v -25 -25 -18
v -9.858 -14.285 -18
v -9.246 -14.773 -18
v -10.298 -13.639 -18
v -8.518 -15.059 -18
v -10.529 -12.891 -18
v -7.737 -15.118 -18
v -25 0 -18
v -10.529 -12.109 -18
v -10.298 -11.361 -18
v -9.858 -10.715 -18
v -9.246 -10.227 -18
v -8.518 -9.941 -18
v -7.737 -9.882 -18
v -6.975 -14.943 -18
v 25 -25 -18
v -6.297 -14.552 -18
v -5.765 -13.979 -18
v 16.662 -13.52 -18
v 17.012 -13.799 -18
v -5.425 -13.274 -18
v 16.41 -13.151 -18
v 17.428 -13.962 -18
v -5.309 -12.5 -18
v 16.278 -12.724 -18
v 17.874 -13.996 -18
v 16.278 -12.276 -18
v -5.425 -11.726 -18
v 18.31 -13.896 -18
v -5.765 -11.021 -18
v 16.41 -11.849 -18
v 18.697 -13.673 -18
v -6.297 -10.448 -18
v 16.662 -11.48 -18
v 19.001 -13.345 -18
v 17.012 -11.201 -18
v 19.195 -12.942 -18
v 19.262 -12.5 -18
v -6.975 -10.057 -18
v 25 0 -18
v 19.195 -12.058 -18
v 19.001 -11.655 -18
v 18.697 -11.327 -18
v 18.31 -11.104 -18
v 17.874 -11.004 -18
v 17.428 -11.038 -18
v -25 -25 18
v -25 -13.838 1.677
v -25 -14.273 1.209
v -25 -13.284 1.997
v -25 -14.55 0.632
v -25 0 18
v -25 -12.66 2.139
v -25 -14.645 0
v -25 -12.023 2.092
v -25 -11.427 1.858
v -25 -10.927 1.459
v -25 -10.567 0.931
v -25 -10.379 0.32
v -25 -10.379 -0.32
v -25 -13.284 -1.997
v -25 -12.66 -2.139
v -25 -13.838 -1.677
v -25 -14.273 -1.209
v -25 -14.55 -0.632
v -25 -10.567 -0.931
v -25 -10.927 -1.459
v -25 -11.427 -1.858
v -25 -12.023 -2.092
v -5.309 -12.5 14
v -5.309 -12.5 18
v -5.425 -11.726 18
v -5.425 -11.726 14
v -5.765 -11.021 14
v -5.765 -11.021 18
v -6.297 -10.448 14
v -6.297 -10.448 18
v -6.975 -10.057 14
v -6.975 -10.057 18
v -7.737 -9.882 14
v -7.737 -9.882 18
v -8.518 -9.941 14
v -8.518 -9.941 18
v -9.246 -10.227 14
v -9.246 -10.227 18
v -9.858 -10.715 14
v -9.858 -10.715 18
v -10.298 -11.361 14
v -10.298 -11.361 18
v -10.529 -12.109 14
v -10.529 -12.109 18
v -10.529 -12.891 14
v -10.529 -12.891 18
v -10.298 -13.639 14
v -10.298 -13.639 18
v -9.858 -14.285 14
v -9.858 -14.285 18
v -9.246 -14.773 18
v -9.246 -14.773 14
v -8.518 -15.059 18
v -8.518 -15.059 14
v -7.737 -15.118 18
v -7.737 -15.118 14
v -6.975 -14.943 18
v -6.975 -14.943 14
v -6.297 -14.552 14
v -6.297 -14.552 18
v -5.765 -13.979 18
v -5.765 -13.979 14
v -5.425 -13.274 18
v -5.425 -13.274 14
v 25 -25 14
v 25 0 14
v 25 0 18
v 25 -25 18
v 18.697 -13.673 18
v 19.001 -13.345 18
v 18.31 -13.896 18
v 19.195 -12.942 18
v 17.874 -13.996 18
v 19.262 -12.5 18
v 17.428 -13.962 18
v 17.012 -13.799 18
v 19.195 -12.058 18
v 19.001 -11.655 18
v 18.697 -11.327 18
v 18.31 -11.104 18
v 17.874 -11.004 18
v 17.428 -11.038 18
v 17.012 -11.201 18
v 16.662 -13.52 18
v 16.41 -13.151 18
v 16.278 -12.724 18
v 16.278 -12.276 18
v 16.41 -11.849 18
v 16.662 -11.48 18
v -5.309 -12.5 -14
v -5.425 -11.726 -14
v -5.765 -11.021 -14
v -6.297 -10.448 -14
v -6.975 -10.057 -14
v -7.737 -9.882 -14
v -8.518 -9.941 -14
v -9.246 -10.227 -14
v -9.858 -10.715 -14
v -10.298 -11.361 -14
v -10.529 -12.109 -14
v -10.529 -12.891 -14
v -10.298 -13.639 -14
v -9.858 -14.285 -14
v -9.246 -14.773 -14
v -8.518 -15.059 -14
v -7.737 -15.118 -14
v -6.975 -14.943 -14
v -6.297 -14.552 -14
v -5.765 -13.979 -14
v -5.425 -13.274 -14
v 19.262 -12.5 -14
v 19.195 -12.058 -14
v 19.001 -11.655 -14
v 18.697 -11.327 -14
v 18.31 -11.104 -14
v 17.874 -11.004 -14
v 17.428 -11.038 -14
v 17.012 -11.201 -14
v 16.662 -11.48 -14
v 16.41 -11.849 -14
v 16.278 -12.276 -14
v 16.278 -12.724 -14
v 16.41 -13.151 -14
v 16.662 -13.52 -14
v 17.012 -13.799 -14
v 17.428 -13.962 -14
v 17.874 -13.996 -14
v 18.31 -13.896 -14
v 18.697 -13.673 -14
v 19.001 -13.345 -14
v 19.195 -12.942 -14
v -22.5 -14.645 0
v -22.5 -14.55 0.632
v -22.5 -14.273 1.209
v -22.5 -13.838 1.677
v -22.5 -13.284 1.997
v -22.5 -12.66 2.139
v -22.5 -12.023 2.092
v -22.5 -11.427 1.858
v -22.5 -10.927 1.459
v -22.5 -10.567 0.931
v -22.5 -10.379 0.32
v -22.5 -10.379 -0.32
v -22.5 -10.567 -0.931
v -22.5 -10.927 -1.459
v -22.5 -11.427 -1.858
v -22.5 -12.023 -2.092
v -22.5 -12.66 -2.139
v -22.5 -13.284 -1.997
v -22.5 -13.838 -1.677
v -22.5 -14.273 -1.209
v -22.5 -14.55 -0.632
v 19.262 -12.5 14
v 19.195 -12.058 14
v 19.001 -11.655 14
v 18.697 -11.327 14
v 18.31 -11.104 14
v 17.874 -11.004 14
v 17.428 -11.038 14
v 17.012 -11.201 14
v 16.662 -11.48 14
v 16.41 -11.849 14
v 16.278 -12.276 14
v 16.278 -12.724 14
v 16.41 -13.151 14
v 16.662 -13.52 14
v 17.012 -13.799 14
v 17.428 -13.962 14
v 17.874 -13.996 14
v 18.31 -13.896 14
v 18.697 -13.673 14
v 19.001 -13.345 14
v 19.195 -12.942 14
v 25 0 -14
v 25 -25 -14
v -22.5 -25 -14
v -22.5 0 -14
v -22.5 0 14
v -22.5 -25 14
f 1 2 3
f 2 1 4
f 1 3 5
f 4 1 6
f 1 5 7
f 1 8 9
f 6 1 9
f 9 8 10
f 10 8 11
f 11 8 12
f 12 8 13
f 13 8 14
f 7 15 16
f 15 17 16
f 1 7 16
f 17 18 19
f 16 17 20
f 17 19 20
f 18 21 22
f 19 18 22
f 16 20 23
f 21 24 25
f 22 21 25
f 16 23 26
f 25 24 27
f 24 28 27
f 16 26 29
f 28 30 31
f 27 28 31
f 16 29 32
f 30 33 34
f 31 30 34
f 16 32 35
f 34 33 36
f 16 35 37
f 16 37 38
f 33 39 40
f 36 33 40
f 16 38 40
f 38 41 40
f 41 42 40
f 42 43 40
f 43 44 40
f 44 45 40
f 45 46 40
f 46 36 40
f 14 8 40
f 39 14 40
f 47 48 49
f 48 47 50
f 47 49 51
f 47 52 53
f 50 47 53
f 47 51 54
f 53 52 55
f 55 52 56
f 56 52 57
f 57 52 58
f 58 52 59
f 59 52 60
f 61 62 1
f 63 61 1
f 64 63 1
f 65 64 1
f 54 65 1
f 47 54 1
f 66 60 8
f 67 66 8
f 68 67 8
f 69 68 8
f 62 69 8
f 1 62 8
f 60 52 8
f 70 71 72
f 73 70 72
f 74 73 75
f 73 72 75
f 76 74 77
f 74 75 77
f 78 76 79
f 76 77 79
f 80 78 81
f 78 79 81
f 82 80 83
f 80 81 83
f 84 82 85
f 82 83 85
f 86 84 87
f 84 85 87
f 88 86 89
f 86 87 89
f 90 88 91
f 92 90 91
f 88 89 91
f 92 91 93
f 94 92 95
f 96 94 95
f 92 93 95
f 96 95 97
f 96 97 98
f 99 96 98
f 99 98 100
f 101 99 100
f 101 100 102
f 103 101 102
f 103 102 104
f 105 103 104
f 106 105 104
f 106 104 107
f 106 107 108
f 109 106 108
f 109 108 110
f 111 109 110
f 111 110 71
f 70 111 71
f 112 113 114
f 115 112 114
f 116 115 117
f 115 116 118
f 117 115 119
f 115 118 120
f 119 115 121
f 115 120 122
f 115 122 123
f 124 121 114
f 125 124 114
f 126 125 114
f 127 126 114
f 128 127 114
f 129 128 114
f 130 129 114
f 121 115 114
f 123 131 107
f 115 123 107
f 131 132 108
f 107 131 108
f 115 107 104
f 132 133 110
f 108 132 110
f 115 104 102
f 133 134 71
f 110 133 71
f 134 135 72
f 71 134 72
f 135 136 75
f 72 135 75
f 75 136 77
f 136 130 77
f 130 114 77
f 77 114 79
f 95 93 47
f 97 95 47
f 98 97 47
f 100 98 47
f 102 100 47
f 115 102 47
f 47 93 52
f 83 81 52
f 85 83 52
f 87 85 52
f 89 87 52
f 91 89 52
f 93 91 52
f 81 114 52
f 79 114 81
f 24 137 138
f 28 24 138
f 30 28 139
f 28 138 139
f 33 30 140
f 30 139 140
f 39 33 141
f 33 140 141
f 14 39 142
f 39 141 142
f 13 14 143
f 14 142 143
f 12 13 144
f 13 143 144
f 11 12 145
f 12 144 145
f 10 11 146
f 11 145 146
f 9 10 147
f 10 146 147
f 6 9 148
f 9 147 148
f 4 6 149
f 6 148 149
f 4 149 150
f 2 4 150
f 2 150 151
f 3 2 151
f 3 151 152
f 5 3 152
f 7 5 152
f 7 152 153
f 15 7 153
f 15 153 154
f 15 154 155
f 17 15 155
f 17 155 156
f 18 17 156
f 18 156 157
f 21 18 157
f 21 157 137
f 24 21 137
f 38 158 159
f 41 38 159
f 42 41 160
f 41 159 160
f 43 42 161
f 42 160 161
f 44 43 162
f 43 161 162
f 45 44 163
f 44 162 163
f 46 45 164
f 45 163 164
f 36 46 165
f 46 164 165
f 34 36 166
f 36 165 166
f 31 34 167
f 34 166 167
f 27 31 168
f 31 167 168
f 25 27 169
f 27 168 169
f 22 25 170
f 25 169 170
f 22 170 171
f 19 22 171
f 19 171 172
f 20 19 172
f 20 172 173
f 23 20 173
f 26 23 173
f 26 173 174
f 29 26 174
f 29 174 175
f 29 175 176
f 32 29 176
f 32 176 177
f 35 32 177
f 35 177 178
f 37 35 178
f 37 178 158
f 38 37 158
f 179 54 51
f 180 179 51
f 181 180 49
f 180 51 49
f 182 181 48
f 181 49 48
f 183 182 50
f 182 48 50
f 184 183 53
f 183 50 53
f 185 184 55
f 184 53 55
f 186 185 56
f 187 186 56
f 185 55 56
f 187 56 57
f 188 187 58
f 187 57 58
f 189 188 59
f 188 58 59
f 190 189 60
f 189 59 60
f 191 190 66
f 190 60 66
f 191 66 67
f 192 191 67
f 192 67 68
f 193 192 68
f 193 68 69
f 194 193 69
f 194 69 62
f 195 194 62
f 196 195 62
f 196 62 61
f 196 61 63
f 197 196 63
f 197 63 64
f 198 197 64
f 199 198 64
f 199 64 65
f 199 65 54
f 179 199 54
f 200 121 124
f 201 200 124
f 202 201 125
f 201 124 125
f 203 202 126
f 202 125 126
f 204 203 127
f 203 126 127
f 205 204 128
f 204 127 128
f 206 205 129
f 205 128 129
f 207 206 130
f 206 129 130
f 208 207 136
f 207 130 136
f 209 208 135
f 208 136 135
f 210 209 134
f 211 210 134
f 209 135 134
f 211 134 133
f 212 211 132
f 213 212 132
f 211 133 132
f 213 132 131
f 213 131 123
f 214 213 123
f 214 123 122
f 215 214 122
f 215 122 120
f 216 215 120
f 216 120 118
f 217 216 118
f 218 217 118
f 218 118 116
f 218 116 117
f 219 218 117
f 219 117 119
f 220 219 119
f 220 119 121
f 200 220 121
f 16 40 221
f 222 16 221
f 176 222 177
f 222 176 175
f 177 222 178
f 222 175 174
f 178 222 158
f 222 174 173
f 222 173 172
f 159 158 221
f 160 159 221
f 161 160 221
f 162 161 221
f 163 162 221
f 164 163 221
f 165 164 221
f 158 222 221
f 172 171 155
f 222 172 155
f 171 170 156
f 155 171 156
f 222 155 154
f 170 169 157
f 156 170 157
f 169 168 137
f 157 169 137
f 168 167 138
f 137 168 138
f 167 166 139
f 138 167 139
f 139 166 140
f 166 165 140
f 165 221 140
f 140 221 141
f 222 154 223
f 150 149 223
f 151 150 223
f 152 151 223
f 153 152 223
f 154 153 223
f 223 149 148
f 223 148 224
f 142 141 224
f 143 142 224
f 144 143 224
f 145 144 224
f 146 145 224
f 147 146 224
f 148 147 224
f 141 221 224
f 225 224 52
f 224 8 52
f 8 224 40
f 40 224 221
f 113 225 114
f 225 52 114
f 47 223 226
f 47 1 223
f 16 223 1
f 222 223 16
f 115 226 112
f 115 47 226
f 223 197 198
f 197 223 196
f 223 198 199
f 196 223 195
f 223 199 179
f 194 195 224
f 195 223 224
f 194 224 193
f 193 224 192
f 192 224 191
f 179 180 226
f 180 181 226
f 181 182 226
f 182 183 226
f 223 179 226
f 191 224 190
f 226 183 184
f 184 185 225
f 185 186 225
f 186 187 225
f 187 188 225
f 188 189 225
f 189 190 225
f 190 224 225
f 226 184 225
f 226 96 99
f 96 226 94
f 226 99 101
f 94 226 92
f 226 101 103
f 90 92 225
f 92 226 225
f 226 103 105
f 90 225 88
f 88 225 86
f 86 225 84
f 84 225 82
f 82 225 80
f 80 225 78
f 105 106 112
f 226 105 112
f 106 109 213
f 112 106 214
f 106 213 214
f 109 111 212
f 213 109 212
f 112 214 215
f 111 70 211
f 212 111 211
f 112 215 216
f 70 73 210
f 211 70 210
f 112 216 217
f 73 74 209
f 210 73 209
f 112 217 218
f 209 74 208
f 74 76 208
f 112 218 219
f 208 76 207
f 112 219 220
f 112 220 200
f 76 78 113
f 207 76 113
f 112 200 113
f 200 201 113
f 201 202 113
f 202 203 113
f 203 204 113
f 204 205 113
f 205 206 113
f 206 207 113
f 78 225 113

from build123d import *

# Parameters (mm, degrees)
F1_DEPTH = 25
F2_R     = 1.5
F3_DEPTH = 36.001
F4_R     = 2.145417
F5_DEPTH = 50.001
F6_R     = 2.624868
F7_DEPTH = 36.001


with BuildPart() as f1:
    # F0 (on Front) → F1 (new body)
    with BuildSketch(Plane.XZ):
        Polygon((25, 18), (-25, 18), (-25, -18), (25, -18), (25, -14), (22.5, -14), (-22.5, -14), (-22.5, 14), (22.5, 14), (25, 14), align=None)
    extrude(amount=F1_DEPTH)

    # F2 (on face) → F3 (cut, through all)
    with BuildSketch(Plane.XY.offset(18)):
        with Locations((17.761598, -12.5)):
            Circle(F2_R)
    extrude(amount=-F3_DEPTH, mode=Mode.SUBTRACT)

    # F4 (on face) → F5 (cut, through all)
    with BuildSketch(Plane(origin=(-25, 0, 0), x_dir=(0, -1, 0), z_dir=(-1, 0, 0))):
        with Locations((12.5, 0)):
            Circle(F4_R)
    extrude(amount=-F5_DEPTH, mode=Mode.SUBTRACT)

    # F6 (on face) → F7 (cut, through all)
    with BuildSketch(Plane.XY.offset(18)):
        with Locations((-7.933488, -12.5)):
            Circle(F6_R)
    extrude(amount=-F7_DEPTH, mode=Mode.SUBTRACT)


solid = f1.part
